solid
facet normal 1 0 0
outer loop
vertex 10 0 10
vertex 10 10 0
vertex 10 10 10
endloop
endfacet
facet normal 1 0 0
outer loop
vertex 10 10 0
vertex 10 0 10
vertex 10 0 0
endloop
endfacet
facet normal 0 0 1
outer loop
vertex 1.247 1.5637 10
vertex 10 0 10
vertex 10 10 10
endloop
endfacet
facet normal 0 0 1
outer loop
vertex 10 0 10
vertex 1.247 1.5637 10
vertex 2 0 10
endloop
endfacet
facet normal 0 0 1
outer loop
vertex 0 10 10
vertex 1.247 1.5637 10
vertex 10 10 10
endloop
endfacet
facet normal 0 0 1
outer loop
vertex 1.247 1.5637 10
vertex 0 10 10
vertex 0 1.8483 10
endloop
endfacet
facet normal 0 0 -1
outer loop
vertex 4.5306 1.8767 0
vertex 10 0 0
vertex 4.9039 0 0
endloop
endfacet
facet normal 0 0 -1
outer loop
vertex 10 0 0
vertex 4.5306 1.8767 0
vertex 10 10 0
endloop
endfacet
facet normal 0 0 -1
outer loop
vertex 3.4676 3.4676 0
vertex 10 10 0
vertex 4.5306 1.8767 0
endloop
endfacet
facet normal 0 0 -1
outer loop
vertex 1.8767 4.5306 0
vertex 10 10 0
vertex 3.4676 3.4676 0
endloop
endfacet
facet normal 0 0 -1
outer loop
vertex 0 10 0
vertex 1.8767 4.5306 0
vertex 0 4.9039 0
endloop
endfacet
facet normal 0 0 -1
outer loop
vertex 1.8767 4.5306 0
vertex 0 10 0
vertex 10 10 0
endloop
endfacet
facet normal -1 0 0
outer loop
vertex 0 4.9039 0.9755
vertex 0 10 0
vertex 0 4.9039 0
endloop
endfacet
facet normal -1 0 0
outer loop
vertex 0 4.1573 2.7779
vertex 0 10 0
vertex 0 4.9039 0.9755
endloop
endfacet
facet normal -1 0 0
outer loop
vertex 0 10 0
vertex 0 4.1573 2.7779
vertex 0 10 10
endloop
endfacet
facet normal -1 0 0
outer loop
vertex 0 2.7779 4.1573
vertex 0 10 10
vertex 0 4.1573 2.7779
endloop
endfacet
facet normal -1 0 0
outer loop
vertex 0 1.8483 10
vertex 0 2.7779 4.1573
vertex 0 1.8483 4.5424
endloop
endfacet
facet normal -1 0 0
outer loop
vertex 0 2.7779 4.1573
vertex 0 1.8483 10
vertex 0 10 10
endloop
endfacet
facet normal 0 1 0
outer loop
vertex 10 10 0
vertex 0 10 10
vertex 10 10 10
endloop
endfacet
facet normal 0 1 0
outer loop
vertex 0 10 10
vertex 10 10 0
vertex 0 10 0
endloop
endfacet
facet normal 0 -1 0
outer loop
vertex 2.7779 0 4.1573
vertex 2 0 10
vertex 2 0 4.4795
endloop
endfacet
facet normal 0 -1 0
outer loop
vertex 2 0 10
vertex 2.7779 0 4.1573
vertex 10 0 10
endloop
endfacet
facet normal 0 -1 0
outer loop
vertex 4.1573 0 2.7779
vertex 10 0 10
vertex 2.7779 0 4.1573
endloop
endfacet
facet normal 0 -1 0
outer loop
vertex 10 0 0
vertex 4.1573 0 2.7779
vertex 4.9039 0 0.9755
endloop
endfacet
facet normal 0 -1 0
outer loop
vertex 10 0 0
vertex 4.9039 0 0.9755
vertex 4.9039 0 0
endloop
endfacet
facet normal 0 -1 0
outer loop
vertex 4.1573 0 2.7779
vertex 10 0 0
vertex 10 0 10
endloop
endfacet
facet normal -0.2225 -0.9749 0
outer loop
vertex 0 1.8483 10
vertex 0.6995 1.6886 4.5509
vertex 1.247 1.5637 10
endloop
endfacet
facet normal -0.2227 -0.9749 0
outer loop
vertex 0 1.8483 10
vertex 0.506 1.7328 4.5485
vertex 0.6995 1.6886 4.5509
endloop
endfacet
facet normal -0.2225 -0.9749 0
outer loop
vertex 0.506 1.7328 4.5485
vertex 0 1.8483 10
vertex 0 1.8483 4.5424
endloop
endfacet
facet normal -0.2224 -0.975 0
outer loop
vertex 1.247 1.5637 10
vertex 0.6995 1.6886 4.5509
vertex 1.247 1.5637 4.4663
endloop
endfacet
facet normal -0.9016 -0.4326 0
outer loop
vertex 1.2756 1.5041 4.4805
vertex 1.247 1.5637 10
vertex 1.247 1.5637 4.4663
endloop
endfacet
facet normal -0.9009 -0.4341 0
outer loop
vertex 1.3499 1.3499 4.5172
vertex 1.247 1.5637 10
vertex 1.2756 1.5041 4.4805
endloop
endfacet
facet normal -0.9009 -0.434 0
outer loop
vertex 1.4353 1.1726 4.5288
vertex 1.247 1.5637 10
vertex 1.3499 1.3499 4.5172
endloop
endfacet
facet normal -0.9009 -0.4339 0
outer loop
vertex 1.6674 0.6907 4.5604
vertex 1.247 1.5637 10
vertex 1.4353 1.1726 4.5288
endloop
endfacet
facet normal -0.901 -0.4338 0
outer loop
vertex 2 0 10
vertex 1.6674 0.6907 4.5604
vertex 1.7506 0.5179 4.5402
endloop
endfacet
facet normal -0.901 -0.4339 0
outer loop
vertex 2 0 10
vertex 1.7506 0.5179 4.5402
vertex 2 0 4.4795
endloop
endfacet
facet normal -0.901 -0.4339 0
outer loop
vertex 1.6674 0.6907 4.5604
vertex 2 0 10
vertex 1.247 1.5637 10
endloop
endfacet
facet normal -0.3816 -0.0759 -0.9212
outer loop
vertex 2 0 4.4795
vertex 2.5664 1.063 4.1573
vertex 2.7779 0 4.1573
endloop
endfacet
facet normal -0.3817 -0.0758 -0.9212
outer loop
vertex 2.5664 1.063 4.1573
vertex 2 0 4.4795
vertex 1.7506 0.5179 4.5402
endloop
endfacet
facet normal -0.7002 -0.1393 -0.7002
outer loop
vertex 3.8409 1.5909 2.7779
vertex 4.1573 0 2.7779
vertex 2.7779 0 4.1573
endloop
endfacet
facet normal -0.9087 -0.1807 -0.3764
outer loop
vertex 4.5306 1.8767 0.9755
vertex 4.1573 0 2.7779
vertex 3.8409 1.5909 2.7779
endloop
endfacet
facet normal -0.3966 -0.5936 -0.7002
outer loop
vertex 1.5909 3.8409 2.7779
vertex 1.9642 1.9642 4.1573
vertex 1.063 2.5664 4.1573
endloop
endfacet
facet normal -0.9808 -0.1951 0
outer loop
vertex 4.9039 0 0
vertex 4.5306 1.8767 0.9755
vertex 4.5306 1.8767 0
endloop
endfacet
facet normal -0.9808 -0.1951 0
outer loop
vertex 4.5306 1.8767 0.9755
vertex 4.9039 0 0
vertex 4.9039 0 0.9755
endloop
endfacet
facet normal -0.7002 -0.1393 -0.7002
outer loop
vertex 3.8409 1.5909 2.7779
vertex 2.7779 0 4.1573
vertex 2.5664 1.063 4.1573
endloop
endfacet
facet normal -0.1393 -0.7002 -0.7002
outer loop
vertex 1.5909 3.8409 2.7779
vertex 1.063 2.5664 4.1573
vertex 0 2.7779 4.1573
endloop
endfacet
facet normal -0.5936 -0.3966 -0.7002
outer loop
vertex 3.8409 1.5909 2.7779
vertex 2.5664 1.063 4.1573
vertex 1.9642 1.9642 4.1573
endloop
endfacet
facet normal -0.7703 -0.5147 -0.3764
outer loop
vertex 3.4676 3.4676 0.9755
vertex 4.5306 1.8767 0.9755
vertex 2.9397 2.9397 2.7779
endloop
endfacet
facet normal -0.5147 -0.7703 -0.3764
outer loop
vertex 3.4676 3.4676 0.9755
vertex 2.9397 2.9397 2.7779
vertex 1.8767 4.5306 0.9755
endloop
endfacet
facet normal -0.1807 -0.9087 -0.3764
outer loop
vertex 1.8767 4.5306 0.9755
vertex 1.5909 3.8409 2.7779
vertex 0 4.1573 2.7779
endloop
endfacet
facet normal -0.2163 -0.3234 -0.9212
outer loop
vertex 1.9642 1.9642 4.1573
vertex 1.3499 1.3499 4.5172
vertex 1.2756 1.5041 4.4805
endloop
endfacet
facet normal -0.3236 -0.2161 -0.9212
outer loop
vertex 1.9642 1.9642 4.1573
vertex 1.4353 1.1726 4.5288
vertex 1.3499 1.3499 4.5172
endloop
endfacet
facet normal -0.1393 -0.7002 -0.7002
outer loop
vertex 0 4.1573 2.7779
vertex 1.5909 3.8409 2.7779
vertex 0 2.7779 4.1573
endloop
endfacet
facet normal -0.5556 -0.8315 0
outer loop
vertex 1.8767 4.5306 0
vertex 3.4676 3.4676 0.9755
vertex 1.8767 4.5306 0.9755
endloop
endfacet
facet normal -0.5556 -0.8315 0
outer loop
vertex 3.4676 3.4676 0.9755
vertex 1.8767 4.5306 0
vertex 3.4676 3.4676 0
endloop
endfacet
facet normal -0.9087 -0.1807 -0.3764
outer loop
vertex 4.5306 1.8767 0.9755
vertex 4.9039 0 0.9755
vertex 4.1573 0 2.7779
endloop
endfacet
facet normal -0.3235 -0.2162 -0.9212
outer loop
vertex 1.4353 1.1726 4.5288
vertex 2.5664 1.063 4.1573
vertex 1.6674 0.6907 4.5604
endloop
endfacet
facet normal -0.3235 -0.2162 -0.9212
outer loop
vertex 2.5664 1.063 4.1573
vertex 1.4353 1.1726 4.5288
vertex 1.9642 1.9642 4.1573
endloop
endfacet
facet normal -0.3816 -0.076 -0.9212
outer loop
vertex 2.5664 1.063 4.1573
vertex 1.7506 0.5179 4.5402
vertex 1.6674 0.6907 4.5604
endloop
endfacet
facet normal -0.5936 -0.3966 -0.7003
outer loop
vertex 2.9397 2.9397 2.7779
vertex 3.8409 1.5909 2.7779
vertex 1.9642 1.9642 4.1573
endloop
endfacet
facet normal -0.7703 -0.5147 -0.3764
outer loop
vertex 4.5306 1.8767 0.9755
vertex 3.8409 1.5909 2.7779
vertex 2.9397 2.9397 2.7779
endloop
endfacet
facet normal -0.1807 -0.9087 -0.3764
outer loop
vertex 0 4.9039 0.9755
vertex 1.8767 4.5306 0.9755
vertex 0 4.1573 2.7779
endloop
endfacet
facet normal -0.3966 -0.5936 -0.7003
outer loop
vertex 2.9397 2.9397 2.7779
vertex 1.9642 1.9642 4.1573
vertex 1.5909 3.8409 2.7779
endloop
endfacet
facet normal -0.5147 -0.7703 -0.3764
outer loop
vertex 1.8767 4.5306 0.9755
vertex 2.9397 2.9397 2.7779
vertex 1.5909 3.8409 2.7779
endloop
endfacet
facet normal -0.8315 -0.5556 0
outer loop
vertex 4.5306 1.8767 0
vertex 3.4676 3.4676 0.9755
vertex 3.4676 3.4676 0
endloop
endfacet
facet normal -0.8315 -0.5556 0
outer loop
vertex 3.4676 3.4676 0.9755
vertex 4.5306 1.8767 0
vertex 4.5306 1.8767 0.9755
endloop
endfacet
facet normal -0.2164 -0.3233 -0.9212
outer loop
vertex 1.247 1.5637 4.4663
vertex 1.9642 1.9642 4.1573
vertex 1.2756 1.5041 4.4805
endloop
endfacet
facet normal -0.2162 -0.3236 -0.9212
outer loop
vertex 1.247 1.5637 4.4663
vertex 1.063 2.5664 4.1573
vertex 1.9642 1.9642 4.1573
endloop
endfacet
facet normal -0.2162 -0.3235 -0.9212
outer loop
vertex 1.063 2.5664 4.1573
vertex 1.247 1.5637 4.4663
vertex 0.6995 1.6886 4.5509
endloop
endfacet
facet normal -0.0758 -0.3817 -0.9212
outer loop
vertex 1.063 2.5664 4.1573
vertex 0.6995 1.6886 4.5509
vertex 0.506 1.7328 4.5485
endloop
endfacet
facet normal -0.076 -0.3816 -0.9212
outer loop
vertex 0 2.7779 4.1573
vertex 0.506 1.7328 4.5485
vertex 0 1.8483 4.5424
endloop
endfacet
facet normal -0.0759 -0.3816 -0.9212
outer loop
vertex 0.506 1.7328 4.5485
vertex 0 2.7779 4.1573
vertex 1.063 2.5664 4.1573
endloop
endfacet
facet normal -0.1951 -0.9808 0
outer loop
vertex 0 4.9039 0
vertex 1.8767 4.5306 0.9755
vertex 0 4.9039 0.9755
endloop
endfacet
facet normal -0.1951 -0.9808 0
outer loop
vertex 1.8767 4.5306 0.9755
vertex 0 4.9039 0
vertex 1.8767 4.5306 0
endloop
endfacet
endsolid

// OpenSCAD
difference() {
    cube([10, 10, 10]);
    cylinder(r=2, h=10);
    sphere(5);
}
